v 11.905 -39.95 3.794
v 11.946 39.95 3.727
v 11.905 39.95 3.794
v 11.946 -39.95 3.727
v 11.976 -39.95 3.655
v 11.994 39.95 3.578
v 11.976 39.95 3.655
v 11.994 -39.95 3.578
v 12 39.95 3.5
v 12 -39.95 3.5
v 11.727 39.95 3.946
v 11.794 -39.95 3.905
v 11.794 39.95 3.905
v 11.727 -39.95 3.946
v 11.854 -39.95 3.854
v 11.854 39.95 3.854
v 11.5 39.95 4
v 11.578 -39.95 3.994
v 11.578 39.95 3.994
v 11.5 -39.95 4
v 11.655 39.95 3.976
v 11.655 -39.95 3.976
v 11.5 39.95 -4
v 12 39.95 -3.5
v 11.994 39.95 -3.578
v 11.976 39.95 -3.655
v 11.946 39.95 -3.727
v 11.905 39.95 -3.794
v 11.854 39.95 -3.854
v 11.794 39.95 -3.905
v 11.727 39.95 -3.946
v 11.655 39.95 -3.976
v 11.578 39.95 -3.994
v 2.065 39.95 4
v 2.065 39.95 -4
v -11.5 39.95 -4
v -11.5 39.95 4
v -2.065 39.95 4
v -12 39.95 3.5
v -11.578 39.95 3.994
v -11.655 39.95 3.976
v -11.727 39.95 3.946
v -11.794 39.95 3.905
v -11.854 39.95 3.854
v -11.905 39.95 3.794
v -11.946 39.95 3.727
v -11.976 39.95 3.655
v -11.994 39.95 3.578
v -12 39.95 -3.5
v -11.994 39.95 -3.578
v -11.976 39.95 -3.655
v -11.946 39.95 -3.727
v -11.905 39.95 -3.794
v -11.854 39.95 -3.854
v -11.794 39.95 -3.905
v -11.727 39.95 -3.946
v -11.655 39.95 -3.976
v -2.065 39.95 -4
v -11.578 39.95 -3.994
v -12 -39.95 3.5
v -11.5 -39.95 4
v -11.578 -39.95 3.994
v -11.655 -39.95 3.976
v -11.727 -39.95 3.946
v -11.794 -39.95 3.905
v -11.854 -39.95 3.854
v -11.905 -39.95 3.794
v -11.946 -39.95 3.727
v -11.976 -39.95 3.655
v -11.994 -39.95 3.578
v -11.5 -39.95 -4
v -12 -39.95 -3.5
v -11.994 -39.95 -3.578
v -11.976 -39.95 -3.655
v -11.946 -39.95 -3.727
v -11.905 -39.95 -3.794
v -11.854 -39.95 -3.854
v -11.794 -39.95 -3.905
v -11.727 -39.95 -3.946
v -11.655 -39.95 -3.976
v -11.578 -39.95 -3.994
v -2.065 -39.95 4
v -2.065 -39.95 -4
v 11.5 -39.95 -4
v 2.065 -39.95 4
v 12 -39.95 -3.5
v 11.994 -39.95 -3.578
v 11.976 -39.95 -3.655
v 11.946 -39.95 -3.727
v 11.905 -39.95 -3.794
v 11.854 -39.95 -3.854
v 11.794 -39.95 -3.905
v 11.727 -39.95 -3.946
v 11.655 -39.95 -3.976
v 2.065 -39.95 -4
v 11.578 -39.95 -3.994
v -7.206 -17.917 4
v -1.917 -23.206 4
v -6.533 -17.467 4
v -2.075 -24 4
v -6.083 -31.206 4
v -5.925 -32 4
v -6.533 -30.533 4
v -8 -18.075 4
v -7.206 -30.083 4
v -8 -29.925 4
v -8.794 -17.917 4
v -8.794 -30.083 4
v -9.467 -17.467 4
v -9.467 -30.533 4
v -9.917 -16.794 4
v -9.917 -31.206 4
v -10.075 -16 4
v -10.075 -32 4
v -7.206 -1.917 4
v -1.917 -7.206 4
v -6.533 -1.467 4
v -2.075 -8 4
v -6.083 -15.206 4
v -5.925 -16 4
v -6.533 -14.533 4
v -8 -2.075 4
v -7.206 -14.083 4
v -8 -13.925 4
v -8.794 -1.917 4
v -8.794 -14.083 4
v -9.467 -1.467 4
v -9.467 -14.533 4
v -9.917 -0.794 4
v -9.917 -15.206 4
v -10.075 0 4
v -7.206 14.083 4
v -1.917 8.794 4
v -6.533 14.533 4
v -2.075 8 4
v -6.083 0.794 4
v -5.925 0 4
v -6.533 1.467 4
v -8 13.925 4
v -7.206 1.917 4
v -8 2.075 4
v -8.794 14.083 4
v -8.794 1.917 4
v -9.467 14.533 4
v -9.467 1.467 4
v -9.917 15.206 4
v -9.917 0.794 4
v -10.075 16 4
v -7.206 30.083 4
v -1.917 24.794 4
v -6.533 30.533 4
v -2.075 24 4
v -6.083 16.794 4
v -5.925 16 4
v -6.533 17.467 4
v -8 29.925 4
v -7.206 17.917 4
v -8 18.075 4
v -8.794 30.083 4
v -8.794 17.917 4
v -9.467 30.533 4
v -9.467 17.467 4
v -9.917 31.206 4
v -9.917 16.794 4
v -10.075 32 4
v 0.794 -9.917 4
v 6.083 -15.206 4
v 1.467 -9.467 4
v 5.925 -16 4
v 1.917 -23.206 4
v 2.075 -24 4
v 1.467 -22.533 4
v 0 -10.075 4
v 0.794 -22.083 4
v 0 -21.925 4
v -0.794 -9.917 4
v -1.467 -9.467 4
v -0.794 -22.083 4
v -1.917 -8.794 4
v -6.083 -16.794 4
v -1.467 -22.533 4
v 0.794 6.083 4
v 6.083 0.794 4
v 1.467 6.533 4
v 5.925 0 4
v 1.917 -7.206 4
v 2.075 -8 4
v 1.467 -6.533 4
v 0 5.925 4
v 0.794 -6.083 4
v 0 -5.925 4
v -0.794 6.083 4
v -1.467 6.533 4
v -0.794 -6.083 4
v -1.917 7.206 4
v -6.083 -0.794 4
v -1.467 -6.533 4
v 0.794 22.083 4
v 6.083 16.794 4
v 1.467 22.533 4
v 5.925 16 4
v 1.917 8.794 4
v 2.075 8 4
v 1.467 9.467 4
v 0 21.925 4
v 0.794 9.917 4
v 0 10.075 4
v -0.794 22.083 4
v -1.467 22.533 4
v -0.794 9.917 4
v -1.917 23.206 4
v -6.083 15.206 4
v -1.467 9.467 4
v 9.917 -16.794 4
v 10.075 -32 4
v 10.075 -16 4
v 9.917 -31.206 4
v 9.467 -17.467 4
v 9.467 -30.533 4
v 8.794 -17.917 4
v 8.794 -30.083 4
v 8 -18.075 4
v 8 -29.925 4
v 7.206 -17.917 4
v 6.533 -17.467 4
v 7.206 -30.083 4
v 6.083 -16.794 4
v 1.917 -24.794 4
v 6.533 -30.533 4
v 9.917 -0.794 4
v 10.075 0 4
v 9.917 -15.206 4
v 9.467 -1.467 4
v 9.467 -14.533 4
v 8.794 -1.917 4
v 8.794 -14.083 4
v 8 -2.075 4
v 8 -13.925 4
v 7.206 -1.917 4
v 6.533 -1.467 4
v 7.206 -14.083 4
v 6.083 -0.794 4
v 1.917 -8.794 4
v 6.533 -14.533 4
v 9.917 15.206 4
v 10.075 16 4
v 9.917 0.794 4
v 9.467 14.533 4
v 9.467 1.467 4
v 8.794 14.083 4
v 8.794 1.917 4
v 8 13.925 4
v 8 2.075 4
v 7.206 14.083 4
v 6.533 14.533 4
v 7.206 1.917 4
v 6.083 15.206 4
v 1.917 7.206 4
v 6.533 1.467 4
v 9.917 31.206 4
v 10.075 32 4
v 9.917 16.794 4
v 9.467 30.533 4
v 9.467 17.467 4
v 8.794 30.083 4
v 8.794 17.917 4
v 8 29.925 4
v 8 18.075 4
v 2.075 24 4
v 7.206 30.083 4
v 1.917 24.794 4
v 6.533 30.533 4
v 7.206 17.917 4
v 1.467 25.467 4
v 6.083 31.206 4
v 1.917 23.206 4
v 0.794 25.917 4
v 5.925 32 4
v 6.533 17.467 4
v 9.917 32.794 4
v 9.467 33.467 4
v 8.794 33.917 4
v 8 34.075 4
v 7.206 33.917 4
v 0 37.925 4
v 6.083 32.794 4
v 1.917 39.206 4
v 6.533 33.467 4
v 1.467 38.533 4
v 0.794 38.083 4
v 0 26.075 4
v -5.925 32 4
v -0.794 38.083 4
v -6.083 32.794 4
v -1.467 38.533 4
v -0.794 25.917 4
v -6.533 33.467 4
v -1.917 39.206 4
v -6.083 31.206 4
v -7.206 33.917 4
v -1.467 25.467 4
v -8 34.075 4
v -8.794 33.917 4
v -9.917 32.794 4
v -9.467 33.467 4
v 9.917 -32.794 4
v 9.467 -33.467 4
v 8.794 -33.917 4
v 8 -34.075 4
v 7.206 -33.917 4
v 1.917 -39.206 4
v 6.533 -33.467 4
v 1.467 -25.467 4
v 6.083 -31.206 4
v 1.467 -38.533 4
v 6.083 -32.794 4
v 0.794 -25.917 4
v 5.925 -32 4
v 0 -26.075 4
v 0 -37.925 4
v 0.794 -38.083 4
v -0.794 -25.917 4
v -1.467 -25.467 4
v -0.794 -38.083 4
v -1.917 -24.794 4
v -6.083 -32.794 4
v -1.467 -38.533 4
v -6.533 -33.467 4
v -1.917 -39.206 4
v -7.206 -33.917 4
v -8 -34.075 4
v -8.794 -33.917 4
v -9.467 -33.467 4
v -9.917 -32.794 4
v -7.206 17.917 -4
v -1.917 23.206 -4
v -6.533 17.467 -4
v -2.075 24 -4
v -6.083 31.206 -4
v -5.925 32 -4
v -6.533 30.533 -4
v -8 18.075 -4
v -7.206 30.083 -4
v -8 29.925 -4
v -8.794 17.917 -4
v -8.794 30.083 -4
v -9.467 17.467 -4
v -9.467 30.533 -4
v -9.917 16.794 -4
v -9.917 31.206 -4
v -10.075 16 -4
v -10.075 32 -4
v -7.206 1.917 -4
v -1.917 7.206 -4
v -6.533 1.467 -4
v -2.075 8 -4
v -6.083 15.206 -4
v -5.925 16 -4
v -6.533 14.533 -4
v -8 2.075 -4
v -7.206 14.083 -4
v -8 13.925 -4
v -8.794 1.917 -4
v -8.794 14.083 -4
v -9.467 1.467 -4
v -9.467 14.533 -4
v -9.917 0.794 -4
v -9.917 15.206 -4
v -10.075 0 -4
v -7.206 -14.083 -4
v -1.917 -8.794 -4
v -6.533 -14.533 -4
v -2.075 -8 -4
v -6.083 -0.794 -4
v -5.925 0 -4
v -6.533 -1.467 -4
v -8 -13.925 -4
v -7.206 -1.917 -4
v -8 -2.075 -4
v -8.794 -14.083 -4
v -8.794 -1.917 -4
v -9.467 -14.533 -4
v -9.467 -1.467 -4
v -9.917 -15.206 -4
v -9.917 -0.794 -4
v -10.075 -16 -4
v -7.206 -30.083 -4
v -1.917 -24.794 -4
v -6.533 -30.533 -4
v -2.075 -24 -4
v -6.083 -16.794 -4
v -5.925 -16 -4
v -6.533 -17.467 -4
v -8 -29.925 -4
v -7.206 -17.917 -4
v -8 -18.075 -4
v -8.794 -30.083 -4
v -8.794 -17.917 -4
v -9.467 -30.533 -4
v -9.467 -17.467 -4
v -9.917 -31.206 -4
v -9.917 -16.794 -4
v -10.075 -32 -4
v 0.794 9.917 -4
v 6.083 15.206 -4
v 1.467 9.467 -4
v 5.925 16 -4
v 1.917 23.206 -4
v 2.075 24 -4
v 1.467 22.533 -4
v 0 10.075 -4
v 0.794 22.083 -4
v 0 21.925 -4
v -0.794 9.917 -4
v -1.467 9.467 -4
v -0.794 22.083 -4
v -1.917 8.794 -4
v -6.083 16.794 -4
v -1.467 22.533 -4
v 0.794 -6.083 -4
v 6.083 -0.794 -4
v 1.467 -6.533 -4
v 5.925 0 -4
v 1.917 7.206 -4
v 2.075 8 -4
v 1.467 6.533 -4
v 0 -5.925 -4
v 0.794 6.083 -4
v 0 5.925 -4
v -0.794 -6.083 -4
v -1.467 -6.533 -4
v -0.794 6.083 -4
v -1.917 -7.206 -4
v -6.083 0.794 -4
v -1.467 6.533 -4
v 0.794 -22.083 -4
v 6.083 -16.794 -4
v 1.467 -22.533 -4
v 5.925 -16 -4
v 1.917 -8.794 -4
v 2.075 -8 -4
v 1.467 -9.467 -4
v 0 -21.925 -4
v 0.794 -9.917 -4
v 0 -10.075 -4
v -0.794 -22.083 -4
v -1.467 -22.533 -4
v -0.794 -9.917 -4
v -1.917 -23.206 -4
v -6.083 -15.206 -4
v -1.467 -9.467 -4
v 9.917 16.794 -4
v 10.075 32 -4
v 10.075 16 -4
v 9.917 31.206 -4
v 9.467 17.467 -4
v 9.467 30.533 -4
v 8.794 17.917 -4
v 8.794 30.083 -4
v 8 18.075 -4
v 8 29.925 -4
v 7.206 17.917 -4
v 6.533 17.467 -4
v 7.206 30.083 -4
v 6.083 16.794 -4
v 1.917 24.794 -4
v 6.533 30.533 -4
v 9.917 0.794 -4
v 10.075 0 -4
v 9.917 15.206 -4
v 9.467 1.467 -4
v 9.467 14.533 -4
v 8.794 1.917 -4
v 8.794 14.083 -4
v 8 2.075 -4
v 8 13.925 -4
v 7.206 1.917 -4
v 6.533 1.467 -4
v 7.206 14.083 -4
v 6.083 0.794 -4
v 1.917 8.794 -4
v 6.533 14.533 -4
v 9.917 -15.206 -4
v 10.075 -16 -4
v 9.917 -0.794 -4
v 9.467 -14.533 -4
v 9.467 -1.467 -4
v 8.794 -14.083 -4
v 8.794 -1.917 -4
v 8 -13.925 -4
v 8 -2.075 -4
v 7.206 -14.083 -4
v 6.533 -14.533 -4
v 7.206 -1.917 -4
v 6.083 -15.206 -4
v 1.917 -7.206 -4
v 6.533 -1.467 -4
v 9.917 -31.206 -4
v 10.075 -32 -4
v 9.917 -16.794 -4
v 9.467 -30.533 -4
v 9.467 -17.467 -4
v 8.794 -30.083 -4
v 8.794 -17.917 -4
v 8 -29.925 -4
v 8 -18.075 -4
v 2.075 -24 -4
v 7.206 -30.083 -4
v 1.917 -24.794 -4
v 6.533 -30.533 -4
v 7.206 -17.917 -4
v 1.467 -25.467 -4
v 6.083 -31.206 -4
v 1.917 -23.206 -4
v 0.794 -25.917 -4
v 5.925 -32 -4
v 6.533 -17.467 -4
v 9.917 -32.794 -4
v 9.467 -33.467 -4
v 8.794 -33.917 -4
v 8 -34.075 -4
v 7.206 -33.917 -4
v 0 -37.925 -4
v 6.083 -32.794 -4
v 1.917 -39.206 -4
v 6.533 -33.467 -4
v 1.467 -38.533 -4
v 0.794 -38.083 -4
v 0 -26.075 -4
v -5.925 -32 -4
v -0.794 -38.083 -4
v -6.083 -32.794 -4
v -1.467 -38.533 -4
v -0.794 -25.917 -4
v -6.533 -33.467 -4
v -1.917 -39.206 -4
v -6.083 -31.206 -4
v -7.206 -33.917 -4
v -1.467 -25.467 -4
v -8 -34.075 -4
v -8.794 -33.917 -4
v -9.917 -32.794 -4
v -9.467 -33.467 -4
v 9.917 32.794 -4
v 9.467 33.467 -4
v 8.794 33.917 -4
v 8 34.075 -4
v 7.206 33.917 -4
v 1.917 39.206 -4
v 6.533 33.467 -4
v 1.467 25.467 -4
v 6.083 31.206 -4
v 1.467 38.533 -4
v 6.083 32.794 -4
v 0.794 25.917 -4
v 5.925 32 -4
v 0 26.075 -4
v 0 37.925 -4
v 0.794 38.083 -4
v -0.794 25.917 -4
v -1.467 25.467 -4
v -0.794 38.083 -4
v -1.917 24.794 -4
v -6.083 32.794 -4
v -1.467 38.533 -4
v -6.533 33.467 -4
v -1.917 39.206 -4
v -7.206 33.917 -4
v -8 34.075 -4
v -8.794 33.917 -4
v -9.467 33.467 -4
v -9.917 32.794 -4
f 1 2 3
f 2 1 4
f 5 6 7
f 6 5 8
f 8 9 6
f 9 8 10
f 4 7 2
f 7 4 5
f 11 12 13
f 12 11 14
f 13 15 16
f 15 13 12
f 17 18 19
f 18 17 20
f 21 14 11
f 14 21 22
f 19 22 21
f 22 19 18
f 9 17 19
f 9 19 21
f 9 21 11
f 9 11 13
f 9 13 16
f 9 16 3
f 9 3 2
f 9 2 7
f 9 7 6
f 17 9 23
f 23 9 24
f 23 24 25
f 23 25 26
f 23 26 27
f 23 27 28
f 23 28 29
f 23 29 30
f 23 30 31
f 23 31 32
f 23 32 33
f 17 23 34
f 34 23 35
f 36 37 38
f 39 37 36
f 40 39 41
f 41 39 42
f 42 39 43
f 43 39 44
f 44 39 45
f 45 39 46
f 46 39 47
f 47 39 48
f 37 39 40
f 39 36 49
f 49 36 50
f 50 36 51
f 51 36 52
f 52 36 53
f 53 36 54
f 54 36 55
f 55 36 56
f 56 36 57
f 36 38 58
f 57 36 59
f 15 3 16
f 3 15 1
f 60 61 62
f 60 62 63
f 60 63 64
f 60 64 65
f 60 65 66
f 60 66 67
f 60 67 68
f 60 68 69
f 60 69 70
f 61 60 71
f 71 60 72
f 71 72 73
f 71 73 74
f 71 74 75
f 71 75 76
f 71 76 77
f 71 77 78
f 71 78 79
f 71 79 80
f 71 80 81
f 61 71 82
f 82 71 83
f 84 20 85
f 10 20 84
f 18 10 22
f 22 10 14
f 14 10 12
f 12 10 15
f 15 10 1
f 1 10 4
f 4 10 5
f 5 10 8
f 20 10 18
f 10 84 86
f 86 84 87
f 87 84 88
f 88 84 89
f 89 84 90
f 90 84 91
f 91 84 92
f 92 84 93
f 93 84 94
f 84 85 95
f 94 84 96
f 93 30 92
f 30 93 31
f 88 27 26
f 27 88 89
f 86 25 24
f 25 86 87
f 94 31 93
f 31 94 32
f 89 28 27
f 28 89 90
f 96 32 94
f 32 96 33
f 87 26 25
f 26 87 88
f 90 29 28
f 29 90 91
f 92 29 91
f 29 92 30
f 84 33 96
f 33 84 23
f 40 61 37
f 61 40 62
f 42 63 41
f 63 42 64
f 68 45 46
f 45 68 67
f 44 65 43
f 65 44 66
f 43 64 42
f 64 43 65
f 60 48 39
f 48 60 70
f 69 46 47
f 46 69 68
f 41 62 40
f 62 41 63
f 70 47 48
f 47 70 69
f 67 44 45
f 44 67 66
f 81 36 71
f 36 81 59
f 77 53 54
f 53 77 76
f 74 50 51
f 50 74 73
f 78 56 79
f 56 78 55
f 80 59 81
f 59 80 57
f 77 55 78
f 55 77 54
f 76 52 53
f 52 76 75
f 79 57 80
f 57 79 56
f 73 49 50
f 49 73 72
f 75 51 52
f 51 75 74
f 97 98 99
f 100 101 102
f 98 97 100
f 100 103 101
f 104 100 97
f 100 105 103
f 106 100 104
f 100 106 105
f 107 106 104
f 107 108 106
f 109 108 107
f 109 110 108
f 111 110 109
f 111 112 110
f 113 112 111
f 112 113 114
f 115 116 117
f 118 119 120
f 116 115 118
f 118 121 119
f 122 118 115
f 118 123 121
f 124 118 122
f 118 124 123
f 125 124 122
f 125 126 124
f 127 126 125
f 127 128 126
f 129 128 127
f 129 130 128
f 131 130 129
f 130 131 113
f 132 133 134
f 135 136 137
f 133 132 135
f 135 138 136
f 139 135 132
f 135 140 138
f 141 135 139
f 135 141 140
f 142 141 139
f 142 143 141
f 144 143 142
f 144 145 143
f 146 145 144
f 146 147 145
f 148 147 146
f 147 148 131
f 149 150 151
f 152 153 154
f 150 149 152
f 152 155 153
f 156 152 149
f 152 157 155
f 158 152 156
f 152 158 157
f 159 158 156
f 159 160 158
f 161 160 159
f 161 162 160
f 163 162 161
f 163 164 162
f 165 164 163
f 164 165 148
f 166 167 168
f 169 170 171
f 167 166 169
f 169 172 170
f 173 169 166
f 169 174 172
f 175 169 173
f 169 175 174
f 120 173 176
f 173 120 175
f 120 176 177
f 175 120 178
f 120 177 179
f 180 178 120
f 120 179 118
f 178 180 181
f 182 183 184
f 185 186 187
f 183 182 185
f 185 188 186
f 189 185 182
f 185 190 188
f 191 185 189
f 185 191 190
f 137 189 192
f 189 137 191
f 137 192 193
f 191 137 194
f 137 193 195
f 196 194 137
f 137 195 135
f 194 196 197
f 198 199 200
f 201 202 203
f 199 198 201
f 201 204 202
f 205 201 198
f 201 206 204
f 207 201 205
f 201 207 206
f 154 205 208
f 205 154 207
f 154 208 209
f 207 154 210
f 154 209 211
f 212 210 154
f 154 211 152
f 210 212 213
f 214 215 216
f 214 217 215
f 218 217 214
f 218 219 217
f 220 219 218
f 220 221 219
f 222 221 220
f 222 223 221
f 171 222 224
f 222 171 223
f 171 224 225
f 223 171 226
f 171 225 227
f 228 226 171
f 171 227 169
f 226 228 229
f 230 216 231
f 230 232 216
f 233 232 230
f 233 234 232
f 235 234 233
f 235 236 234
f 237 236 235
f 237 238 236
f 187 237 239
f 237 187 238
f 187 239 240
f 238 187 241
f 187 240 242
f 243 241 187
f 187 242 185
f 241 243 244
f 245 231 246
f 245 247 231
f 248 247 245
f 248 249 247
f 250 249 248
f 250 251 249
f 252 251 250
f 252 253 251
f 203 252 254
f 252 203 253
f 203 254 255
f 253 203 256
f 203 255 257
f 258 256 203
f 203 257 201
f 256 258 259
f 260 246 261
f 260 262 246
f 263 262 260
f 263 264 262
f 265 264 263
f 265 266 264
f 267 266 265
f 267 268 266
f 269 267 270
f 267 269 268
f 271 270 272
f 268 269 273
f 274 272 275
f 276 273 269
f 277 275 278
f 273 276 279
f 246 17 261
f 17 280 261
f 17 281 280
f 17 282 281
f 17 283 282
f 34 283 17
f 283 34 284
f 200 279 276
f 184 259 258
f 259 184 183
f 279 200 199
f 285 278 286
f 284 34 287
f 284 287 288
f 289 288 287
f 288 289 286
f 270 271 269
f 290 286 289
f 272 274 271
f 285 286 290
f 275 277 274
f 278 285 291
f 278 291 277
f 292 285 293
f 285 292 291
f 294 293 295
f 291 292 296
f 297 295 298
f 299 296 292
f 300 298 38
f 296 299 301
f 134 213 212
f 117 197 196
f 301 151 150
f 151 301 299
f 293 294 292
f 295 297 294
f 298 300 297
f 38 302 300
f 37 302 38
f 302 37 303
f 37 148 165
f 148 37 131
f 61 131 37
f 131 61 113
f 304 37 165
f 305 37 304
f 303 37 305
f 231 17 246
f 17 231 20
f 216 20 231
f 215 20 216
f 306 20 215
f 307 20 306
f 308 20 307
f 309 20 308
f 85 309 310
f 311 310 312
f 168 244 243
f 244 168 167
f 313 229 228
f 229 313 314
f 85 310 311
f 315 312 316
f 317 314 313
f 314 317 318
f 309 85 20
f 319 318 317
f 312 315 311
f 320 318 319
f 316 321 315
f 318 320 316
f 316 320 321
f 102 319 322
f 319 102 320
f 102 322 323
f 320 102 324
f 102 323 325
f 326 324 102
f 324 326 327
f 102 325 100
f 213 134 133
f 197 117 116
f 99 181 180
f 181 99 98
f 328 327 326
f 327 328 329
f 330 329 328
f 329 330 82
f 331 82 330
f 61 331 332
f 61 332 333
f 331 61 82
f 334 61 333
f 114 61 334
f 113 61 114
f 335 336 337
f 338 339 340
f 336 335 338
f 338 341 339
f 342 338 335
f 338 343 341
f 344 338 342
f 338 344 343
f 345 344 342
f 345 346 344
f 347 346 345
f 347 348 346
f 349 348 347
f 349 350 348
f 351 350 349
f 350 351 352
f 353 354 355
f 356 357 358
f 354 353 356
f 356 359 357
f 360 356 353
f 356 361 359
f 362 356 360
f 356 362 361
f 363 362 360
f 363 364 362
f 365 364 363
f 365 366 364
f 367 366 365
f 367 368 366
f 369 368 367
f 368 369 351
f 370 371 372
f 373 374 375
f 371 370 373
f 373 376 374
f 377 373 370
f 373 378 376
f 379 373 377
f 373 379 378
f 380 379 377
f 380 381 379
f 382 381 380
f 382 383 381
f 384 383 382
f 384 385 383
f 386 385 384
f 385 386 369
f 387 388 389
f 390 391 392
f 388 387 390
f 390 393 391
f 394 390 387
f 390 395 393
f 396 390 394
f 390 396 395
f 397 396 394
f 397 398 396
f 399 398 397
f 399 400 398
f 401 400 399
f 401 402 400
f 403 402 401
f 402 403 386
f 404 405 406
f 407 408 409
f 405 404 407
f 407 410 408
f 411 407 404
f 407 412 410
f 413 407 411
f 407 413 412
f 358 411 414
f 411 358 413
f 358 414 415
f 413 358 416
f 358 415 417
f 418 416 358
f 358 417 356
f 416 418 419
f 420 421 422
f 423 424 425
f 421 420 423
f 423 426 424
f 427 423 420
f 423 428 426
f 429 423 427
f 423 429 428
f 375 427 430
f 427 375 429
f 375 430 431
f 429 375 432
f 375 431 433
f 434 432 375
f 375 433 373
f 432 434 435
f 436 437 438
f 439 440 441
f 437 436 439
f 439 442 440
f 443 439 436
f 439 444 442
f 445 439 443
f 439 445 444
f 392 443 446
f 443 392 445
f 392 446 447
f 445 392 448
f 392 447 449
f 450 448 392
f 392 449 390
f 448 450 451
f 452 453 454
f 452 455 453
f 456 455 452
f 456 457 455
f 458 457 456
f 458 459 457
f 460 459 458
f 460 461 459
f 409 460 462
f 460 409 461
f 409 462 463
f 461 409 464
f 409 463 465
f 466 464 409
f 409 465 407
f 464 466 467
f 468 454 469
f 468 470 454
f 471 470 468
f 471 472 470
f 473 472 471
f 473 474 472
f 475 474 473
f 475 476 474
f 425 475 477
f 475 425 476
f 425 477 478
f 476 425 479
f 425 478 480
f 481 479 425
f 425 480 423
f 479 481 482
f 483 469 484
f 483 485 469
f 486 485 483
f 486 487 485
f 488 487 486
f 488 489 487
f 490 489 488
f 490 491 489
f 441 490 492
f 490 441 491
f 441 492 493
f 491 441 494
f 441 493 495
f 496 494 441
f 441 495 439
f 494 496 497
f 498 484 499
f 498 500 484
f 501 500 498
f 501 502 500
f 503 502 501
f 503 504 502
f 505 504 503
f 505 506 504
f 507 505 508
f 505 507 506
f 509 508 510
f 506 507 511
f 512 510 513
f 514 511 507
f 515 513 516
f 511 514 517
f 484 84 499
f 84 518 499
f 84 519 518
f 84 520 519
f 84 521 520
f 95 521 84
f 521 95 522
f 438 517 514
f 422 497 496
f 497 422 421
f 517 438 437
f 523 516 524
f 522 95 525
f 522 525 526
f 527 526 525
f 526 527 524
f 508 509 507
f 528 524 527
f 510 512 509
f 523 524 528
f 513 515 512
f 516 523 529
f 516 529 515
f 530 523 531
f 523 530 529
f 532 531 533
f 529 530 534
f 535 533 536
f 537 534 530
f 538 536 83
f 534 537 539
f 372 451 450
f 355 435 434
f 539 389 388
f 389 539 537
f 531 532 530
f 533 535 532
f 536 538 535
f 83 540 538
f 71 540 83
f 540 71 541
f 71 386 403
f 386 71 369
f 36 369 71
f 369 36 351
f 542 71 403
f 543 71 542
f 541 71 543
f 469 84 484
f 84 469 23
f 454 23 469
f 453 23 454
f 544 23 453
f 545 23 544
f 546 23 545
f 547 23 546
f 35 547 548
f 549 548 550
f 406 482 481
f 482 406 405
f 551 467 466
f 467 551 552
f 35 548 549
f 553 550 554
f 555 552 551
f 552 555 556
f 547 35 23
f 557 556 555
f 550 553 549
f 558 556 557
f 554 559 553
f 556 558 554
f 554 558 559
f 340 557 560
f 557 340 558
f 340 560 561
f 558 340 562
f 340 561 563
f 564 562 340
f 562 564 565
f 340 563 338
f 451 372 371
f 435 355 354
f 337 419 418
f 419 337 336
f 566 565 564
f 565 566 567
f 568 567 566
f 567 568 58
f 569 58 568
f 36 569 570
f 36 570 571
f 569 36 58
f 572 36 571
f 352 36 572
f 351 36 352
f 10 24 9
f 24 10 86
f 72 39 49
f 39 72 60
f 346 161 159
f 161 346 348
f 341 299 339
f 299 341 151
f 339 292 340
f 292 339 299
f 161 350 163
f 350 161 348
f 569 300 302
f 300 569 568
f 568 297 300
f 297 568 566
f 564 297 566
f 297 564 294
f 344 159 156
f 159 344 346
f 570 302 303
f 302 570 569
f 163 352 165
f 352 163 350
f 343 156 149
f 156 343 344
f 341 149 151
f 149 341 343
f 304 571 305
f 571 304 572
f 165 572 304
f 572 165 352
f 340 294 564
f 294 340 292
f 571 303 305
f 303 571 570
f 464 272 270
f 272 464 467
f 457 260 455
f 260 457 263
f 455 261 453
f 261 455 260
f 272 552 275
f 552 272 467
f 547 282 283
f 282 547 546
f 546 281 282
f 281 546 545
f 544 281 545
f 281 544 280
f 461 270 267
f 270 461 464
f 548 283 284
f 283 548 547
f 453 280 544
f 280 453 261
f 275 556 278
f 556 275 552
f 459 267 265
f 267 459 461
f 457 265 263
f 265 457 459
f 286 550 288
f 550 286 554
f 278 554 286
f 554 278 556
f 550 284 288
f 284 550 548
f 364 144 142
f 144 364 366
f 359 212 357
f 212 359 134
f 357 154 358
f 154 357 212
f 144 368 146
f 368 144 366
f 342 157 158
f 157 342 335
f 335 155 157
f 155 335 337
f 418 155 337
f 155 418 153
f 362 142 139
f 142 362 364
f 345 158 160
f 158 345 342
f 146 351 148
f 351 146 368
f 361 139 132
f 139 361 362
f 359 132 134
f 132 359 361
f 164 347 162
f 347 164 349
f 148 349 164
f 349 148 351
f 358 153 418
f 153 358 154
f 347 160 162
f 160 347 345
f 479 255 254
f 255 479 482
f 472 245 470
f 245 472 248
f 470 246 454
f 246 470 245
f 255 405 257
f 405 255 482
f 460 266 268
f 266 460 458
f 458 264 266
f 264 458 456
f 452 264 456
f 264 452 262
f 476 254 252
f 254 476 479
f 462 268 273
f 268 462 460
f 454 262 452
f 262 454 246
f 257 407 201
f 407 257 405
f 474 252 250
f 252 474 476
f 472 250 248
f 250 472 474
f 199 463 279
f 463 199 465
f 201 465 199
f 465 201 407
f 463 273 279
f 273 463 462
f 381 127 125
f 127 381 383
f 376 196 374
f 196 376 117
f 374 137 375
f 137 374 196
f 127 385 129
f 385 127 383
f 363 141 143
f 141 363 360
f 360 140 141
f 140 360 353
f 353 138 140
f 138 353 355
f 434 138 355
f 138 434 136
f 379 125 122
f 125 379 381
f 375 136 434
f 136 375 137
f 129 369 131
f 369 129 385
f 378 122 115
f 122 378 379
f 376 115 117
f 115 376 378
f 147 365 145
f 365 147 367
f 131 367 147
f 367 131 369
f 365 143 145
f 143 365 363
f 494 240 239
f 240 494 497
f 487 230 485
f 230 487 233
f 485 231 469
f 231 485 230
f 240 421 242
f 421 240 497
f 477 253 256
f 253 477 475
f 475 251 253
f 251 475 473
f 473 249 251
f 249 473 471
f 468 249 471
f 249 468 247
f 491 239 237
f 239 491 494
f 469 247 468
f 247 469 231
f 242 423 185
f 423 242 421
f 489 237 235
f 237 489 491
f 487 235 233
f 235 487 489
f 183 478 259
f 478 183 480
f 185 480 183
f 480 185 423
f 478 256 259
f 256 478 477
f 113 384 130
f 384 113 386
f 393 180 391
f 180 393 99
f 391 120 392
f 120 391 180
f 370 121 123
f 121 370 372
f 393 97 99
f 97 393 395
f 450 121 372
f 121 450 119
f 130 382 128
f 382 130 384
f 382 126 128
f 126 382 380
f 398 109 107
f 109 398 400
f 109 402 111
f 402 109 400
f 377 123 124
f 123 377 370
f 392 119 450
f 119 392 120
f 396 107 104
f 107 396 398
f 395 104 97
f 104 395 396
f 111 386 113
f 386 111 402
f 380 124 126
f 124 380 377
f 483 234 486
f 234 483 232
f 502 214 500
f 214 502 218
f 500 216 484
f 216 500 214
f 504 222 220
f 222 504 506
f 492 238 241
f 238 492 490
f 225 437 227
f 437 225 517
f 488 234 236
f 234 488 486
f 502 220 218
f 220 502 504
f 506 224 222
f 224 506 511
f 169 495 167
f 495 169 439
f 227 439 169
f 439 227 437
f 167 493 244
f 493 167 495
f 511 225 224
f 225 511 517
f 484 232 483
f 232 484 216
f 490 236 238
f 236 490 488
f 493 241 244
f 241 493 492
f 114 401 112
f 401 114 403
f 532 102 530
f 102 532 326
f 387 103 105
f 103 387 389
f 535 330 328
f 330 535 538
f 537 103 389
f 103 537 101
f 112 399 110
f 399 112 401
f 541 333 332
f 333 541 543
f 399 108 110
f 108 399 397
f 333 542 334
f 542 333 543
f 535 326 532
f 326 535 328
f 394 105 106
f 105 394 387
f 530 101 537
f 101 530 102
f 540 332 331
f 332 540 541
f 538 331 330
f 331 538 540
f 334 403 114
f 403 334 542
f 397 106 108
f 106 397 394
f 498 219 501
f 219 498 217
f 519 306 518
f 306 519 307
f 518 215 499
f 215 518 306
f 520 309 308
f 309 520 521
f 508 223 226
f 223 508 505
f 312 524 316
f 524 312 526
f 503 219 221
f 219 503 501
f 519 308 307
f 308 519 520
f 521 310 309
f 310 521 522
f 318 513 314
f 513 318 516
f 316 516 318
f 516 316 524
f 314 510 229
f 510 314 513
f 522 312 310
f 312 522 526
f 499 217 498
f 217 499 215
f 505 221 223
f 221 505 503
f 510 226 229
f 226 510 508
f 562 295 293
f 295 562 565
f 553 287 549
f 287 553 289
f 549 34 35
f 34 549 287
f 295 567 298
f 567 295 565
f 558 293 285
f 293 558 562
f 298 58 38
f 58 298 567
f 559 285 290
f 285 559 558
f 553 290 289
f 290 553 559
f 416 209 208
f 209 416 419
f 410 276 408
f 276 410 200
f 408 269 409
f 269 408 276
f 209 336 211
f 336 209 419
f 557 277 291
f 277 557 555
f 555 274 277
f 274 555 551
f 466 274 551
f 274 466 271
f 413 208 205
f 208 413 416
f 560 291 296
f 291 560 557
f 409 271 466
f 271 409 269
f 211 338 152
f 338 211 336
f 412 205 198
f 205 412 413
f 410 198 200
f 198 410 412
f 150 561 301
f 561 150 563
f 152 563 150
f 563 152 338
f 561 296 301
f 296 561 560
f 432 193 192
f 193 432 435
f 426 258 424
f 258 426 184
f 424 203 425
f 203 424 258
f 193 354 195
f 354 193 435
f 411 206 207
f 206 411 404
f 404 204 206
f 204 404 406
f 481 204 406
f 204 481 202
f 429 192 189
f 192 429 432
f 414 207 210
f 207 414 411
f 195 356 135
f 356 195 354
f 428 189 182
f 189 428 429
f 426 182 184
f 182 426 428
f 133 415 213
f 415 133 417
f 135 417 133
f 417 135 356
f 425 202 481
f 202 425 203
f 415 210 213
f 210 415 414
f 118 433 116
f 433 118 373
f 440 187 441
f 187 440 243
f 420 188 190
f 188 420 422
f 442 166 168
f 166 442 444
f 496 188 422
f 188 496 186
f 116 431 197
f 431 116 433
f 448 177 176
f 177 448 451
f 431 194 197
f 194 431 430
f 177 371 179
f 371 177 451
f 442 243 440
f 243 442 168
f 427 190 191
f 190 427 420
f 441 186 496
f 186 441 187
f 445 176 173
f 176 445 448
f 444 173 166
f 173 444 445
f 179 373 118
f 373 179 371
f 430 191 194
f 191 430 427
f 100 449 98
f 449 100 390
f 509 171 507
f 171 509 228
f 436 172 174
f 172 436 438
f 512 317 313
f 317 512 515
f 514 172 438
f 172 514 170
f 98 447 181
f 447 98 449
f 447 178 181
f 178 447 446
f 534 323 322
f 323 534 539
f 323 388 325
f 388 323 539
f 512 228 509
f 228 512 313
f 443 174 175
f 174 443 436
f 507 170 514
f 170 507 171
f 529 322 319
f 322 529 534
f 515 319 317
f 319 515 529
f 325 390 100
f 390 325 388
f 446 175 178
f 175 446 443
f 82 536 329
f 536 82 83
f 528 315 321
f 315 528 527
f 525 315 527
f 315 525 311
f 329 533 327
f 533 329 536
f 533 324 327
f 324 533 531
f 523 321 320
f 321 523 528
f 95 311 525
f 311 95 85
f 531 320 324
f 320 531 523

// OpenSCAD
// Created by Heindal at Thingiverse on March 2015

// Values for user to edit

// Length of extrusion
length = 80; // [16,32,48,64,80,96,112,128,144,160,176,192]
// Diameter of holes in extrusion
holeDia = 4.15; // [3.4:3.4mm for Tap, 4.15:4.15mm for Tight Fit, 4.3:4.3mm for Loose Fit]

/* [Hidden] */
//Number of rows of holes in extrusion
rowCount = floor(length/16);
// Calculated values - edit at your own risk
outsideWidth = 8;
outsideHeight = 24;
outsideLength = 16*rowCount-0.1;

module rounded_box(l,w,h,r_edge){

cube(size=[l-2*r_edge,w-2*r_edge,h ],center=true);

for (x = [l/2-r_edge,-(l/2-r_edge) ]) {
	for (y = [(w/2-r_edge),-(w/2-r_edge)]) {
		translate([x,y,0]) cylinder(r1=r_edge,r2=r_edge,h=h,center=true,$fn=40);
	}
}
translate([0,w/2-r_edge,0]) cube(size=[l-2*r_edge,2*r_edge,h ],center=true);
translate([0,-(w/2-r_edge),0]) cube(size=[l-2*r_edge,2*r_edge,h ],center=true);
translate([(l/2-r_edge),0,0]) cube(size=[2*r_edge,w-2*r_edge,h ],center=true);
translate([-(l/2-r_edge),0,0]) cube(size=[2*r_edge,w-2*r_edge,h ],center=true);

}

rotate([90,0,0]) {
	difference() {
		rounded_box(outsideHeight,outsideWidth, outsideLength, 0.5);
		// mounting holes to match the rail
		for (z = [-16*(rowCount-1)/2 : 16 : 16*(rowCount-1)/2]) {
			for (x = [-8,8]) {
				translate([x,0,z]) rotate([90,0,0]) cylinder(r=holeDia/2, h=outsideWidth+1, center=true, $fn=16);
			}
		}
		// mounting holes to match center slot
		for (z =  [-16*rowCount/2 : 16 : 16*rowCount/2]) {
				translate([0,0,z]) rotate([90,0,0]) cylinder(r=holeDia/2, h=outsideWidth+1, center=true, $fn=16);
		}
	}
}
